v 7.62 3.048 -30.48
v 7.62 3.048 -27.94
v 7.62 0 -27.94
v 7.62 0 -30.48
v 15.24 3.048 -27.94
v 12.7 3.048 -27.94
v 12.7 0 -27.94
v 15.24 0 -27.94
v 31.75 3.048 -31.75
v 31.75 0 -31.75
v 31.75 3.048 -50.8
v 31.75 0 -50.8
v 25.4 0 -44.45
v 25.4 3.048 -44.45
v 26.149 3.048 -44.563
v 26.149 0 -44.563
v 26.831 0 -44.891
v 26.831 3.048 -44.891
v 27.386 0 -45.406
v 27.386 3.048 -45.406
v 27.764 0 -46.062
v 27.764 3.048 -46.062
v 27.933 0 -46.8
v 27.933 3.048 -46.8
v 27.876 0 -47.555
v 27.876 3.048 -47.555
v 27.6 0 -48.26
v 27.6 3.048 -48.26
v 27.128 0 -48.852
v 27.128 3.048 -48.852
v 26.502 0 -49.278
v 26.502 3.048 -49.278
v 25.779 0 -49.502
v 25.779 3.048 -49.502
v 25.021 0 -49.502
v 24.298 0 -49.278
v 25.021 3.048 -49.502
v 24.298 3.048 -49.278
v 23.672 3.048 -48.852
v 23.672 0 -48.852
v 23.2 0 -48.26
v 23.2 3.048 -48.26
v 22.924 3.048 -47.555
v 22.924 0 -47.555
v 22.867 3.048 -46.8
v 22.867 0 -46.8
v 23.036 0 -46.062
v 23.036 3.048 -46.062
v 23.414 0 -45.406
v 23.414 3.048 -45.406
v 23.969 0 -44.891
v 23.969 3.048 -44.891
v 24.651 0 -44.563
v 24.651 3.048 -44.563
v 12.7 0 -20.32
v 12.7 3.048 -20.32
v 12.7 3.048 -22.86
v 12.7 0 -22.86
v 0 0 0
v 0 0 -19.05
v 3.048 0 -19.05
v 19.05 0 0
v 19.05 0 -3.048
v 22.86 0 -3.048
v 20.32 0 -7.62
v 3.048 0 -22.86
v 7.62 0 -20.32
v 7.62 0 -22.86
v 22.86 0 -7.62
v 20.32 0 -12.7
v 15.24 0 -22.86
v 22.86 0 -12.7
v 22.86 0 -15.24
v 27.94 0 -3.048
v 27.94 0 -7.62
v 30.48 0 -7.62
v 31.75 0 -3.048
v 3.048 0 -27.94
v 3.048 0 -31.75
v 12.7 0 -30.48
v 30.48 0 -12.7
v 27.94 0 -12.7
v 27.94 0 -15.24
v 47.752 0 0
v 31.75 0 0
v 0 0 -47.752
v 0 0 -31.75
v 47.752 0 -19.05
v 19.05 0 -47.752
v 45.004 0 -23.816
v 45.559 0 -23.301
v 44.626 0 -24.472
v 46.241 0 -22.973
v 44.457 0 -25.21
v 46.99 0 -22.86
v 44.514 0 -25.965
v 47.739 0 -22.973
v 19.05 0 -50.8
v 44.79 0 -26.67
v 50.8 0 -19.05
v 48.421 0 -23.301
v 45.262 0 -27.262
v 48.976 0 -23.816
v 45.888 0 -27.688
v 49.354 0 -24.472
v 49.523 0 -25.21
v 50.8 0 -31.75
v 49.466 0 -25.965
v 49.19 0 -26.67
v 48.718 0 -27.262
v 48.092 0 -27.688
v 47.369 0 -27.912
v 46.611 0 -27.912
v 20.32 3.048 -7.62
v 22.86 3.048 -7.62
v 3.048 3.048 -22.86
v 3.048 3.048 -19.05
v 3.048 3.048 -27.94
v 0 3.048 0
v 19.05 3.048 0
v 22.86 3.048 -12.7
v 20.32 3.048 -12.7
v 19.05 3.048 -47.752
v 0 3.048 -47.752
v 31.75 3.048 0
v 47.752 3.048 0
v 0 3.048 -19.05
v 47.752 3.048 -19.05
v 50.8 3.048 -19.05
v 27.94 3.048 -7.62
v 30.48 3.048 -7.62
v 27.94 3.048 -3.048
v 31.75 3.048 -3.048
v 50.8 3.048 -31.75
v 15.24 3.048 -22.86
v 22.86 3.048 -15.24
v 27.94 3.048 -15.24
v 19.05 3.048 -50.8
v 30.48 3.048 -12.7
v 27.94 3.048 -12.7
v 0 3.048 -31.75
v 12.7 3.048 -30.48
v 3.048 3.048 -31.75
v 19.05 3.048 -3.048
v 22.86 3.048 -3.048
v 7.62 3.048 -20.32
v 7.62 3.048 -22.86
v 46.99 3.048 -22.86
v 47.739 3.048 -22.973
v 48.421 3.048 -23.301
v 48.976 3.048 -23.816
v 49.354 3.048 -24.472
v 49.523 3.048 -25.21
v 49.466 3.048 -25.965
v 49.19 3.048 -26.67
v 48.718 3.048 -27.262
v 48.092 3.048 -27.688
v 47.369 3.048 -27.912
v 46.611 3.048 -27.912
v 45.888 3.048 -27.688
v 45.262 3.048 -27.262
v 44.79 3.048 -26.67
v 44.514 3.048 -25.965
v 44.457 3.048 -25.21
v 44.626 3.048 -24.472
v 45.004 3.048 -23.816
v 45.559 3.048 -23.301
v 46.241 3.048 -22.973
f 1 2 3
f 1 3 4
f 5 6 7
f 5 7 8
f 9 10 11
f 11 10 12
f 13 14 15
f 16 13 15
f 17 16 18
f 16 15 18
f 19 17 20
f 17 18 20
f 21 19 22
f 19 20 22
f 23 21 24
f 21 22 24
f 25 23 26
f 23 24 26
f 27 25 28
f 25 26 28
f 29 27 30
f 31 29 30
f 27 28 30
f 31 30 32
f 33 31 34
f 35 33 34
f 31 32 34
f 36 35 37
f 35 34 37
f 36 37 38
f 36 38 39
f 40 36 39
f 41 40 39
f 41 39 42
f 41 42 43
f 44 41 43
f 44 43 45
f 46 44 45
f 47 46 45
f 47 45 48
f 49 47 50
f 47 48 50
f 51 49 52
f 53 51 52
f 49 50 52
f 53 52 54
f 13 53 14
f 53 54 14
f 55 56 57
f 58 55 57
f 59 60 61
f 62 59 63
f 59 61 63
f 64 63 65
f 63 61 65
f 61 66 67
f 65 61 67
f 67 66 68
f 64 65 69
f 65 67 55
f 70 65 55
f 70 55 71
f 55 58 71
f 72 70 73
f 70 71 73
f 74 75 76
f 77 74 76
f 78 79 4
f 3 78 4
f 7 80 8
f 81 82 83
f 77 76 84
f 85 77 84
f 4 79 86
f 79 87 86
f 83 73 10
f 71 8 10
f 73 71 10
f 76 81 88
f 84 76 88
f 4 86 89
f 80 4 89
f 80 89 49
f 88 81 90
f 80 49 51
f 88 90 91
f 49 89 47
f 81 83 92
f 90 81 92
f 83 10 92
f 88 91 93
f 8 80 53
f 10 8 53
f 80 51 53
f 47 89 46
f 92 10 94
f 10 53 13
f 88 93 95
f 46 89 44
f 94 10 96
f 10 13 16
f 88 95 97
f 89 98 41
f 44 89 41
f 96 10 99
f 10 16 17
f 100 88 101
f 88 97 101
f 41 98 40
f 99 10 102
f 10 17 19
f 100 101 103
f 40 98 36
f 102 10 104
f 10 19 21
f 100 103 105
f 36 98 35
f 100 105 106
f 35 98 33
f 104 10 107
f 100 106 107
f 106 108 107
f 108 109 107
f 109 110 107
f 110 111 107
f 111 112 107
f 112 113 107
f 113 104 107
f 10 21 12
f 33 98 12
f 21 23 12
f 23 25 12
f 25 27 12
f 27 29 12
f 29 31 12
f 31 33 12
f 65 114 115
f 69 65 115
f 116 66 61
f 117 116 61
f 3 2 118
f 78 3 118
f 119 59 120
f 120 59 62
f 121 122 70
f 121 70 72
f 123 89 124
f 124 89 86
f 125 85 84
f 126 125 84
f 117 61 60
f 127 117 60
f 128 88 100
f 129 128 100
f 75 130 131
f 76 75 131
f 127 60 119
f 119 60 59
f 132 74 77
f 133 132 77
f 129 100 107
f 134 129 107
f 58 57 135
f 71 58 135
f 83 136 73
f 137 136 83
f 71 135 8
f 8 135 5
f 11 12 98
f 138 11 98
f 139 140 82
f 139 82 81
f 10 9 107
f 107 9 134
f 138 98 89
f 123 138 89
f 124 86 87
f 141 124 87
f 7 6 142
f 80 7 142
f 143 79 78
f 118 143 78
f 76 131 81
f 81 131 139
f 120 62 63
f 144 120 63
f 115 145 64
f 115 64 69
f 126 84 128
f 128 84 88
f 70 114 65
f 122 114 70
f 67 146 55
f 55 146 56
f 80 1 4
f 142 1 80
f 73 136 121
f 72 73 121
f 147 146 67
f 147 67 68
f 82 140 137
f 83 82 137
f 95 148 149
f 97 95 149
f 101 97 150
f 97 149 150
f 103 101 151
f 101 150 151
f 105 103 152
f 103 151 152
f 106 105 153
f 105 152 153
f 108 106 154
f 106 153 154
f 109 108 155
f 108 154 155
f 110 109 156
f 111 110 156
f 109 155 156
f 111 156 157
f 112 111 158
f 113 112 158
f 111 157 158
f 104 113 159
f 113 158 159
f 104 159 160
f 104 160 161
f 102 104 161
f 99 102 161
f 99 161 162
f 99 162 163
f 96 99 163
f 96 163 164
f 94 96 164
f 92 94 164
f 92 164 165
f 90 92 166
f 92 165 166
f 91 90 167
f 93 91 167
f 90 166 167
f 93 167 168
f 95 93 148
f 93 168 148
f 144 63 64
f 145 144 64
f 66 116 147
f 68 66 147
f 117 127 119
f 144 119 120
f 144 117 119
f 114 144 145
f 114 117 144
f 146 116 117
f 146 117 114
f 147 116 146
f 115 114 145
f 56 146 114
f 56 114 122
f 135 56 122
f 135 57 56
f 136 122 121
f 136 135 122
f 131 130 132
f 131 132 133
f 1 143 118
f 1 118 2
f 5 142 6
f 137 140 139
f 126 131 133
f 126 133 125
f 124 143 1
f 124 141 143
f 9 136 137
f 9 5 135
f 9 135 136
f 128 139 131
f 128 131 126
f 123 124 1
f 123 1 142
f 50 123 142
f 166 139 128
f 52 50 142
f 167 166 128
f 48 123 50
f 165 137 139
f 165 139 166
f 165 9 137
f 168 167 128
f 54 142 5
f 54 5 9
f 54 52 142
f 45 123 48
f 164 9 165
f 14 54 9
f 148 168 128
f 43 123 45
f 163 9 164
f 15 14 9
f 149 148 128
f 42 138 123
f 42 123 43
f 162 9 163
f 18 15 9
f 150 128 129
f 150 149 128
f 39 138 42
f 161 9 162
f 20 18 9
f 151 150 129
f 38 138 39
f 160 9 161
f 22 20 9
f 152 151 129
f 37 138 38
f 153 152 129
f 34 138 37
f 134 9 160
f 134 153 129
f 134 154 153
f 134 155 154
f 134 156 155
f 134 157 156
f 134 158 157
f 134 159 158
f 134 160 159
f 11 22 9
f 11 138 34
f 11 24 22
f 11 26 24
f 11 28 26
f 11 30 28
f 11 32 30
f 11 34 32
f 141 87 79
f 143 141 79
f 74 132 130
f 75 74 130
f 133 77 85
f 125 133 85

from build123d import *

# Parameters (mm, degrees)
BOSS_EXTRUDE1_DEPTH = 3.048
SKETCH2_W           = 4.572
SKETCH2_H           = 5.08
SKETCH2_W_2         = 5.08
SKETCH2_H_2         = 2.54
SKETCH2_W_3         = 2.54
SKETCH2_H_3         = 4.572
SKETCH2_R           = 2.54
CUT_EXTRUDE1_DEPTH  = 3.048
SKETCH3_W           = 16.002
SKETCH3_H           = 16.002
CUT_EXTRUDE2_DEPTH  = 3.048


with BuildPart() as part:
    # Sketch1 → Boss-Extrude1 (new body)
    with BuildSketch(Plane(origin=(0, 0, 0), x_dir=(1, 0, 0), z_dir=(0, 1, 0))):
        Polygon((0, 19.05), (0, 0), (19.05, 0), (19.05, 3.048), (31.75, 3.048), (31.75, 0), (47.752, 0), (47.752, 19.05), (50.8, 19.05), (50.8, 31.75), (47.752, 31.75), (47.752, 47.752), (31.75, 47.752), (31.75, 50.8), (19.05, 50.8), (19.05, 47.752), (0, 47.752), (0, 31.75), (3.048, 31.75), (3.048, 19.05), align=None)
    extrude(amount=BOSS_EXTRUDE1_DEPTH)

    # Sketch2 → Cut-Extrude1 (cut)
    with BuildSketch(Plane(origin=(0, 3.048, 0), x_dir=(1, 0, 0), z_dir=(0, 1, 0))):
        with Locations((5.334, 25.4)):
            Rectangle(SKETCH2_W, SKETCH2_H)
        with Locations((10.16, 25.4)):
            Rectangle(SKETCH2_W_2, SKETCH2_H)
        with Locations((10.16, 29.21)):
            Rectangle(SKETCH2_W_2, SKETCH2_H_2)
        with Locations((13.97, 25.4)):
            Rectangle(SKETCH2_W_3, SKETCH2_H)
        with Locations((10.16, 21.59)):
            Rectangle(SKETCH2_W_2, SKETCH2_H_2)
        with Locations((25.4, 13.97)):
            Rectangle(SKETCH2_W_2, SKETCH2_H_2)
        with Locations((25.4, 10.16)):
            Rectangle(SKETCH2_W_2, SKETCH2_H)
        with Locations((29.21, 10.16)):
            Rectangle(SKETCH2_W_3, SKETCH2_H)
        with Locations((21.59, 10.16)):
            Rectangle(SKETCH2_W_3, SKETCH2_H)
        with Locations((25.4, 5.334)):
            Rectangle(SKETCH2_W_2, SKETCH2_H_3)
        with Locations(Location((46.99, 25.4, 0), (0, 0, 270))):
            Circle(SKETCH2_R)
        with Locations(Location((25.4, 46.99, 0), (0, 0, 270))):
            Circle(SKETCH2_R)
    extrude(amount=-CUT_EXTRUDE1_DEPTH, mode=Mode.SUBTRACT)

    # Sketch3 → Cut-Extrude2 (cut)
    with BuildSketch(Plane(origin=(0, 3.048, 0), x_dir=(1, 0, 0), z_dir=(0, 1, 0))):
        with Locations((39.751, 39.751)):
            Rectangle(SKETCH3_W, SKETCH3_H)
    extrude(amount=-CUT_EXTRUDE2_DEPTH, mode=Mode.SUBTRACT)


solid = part.part
